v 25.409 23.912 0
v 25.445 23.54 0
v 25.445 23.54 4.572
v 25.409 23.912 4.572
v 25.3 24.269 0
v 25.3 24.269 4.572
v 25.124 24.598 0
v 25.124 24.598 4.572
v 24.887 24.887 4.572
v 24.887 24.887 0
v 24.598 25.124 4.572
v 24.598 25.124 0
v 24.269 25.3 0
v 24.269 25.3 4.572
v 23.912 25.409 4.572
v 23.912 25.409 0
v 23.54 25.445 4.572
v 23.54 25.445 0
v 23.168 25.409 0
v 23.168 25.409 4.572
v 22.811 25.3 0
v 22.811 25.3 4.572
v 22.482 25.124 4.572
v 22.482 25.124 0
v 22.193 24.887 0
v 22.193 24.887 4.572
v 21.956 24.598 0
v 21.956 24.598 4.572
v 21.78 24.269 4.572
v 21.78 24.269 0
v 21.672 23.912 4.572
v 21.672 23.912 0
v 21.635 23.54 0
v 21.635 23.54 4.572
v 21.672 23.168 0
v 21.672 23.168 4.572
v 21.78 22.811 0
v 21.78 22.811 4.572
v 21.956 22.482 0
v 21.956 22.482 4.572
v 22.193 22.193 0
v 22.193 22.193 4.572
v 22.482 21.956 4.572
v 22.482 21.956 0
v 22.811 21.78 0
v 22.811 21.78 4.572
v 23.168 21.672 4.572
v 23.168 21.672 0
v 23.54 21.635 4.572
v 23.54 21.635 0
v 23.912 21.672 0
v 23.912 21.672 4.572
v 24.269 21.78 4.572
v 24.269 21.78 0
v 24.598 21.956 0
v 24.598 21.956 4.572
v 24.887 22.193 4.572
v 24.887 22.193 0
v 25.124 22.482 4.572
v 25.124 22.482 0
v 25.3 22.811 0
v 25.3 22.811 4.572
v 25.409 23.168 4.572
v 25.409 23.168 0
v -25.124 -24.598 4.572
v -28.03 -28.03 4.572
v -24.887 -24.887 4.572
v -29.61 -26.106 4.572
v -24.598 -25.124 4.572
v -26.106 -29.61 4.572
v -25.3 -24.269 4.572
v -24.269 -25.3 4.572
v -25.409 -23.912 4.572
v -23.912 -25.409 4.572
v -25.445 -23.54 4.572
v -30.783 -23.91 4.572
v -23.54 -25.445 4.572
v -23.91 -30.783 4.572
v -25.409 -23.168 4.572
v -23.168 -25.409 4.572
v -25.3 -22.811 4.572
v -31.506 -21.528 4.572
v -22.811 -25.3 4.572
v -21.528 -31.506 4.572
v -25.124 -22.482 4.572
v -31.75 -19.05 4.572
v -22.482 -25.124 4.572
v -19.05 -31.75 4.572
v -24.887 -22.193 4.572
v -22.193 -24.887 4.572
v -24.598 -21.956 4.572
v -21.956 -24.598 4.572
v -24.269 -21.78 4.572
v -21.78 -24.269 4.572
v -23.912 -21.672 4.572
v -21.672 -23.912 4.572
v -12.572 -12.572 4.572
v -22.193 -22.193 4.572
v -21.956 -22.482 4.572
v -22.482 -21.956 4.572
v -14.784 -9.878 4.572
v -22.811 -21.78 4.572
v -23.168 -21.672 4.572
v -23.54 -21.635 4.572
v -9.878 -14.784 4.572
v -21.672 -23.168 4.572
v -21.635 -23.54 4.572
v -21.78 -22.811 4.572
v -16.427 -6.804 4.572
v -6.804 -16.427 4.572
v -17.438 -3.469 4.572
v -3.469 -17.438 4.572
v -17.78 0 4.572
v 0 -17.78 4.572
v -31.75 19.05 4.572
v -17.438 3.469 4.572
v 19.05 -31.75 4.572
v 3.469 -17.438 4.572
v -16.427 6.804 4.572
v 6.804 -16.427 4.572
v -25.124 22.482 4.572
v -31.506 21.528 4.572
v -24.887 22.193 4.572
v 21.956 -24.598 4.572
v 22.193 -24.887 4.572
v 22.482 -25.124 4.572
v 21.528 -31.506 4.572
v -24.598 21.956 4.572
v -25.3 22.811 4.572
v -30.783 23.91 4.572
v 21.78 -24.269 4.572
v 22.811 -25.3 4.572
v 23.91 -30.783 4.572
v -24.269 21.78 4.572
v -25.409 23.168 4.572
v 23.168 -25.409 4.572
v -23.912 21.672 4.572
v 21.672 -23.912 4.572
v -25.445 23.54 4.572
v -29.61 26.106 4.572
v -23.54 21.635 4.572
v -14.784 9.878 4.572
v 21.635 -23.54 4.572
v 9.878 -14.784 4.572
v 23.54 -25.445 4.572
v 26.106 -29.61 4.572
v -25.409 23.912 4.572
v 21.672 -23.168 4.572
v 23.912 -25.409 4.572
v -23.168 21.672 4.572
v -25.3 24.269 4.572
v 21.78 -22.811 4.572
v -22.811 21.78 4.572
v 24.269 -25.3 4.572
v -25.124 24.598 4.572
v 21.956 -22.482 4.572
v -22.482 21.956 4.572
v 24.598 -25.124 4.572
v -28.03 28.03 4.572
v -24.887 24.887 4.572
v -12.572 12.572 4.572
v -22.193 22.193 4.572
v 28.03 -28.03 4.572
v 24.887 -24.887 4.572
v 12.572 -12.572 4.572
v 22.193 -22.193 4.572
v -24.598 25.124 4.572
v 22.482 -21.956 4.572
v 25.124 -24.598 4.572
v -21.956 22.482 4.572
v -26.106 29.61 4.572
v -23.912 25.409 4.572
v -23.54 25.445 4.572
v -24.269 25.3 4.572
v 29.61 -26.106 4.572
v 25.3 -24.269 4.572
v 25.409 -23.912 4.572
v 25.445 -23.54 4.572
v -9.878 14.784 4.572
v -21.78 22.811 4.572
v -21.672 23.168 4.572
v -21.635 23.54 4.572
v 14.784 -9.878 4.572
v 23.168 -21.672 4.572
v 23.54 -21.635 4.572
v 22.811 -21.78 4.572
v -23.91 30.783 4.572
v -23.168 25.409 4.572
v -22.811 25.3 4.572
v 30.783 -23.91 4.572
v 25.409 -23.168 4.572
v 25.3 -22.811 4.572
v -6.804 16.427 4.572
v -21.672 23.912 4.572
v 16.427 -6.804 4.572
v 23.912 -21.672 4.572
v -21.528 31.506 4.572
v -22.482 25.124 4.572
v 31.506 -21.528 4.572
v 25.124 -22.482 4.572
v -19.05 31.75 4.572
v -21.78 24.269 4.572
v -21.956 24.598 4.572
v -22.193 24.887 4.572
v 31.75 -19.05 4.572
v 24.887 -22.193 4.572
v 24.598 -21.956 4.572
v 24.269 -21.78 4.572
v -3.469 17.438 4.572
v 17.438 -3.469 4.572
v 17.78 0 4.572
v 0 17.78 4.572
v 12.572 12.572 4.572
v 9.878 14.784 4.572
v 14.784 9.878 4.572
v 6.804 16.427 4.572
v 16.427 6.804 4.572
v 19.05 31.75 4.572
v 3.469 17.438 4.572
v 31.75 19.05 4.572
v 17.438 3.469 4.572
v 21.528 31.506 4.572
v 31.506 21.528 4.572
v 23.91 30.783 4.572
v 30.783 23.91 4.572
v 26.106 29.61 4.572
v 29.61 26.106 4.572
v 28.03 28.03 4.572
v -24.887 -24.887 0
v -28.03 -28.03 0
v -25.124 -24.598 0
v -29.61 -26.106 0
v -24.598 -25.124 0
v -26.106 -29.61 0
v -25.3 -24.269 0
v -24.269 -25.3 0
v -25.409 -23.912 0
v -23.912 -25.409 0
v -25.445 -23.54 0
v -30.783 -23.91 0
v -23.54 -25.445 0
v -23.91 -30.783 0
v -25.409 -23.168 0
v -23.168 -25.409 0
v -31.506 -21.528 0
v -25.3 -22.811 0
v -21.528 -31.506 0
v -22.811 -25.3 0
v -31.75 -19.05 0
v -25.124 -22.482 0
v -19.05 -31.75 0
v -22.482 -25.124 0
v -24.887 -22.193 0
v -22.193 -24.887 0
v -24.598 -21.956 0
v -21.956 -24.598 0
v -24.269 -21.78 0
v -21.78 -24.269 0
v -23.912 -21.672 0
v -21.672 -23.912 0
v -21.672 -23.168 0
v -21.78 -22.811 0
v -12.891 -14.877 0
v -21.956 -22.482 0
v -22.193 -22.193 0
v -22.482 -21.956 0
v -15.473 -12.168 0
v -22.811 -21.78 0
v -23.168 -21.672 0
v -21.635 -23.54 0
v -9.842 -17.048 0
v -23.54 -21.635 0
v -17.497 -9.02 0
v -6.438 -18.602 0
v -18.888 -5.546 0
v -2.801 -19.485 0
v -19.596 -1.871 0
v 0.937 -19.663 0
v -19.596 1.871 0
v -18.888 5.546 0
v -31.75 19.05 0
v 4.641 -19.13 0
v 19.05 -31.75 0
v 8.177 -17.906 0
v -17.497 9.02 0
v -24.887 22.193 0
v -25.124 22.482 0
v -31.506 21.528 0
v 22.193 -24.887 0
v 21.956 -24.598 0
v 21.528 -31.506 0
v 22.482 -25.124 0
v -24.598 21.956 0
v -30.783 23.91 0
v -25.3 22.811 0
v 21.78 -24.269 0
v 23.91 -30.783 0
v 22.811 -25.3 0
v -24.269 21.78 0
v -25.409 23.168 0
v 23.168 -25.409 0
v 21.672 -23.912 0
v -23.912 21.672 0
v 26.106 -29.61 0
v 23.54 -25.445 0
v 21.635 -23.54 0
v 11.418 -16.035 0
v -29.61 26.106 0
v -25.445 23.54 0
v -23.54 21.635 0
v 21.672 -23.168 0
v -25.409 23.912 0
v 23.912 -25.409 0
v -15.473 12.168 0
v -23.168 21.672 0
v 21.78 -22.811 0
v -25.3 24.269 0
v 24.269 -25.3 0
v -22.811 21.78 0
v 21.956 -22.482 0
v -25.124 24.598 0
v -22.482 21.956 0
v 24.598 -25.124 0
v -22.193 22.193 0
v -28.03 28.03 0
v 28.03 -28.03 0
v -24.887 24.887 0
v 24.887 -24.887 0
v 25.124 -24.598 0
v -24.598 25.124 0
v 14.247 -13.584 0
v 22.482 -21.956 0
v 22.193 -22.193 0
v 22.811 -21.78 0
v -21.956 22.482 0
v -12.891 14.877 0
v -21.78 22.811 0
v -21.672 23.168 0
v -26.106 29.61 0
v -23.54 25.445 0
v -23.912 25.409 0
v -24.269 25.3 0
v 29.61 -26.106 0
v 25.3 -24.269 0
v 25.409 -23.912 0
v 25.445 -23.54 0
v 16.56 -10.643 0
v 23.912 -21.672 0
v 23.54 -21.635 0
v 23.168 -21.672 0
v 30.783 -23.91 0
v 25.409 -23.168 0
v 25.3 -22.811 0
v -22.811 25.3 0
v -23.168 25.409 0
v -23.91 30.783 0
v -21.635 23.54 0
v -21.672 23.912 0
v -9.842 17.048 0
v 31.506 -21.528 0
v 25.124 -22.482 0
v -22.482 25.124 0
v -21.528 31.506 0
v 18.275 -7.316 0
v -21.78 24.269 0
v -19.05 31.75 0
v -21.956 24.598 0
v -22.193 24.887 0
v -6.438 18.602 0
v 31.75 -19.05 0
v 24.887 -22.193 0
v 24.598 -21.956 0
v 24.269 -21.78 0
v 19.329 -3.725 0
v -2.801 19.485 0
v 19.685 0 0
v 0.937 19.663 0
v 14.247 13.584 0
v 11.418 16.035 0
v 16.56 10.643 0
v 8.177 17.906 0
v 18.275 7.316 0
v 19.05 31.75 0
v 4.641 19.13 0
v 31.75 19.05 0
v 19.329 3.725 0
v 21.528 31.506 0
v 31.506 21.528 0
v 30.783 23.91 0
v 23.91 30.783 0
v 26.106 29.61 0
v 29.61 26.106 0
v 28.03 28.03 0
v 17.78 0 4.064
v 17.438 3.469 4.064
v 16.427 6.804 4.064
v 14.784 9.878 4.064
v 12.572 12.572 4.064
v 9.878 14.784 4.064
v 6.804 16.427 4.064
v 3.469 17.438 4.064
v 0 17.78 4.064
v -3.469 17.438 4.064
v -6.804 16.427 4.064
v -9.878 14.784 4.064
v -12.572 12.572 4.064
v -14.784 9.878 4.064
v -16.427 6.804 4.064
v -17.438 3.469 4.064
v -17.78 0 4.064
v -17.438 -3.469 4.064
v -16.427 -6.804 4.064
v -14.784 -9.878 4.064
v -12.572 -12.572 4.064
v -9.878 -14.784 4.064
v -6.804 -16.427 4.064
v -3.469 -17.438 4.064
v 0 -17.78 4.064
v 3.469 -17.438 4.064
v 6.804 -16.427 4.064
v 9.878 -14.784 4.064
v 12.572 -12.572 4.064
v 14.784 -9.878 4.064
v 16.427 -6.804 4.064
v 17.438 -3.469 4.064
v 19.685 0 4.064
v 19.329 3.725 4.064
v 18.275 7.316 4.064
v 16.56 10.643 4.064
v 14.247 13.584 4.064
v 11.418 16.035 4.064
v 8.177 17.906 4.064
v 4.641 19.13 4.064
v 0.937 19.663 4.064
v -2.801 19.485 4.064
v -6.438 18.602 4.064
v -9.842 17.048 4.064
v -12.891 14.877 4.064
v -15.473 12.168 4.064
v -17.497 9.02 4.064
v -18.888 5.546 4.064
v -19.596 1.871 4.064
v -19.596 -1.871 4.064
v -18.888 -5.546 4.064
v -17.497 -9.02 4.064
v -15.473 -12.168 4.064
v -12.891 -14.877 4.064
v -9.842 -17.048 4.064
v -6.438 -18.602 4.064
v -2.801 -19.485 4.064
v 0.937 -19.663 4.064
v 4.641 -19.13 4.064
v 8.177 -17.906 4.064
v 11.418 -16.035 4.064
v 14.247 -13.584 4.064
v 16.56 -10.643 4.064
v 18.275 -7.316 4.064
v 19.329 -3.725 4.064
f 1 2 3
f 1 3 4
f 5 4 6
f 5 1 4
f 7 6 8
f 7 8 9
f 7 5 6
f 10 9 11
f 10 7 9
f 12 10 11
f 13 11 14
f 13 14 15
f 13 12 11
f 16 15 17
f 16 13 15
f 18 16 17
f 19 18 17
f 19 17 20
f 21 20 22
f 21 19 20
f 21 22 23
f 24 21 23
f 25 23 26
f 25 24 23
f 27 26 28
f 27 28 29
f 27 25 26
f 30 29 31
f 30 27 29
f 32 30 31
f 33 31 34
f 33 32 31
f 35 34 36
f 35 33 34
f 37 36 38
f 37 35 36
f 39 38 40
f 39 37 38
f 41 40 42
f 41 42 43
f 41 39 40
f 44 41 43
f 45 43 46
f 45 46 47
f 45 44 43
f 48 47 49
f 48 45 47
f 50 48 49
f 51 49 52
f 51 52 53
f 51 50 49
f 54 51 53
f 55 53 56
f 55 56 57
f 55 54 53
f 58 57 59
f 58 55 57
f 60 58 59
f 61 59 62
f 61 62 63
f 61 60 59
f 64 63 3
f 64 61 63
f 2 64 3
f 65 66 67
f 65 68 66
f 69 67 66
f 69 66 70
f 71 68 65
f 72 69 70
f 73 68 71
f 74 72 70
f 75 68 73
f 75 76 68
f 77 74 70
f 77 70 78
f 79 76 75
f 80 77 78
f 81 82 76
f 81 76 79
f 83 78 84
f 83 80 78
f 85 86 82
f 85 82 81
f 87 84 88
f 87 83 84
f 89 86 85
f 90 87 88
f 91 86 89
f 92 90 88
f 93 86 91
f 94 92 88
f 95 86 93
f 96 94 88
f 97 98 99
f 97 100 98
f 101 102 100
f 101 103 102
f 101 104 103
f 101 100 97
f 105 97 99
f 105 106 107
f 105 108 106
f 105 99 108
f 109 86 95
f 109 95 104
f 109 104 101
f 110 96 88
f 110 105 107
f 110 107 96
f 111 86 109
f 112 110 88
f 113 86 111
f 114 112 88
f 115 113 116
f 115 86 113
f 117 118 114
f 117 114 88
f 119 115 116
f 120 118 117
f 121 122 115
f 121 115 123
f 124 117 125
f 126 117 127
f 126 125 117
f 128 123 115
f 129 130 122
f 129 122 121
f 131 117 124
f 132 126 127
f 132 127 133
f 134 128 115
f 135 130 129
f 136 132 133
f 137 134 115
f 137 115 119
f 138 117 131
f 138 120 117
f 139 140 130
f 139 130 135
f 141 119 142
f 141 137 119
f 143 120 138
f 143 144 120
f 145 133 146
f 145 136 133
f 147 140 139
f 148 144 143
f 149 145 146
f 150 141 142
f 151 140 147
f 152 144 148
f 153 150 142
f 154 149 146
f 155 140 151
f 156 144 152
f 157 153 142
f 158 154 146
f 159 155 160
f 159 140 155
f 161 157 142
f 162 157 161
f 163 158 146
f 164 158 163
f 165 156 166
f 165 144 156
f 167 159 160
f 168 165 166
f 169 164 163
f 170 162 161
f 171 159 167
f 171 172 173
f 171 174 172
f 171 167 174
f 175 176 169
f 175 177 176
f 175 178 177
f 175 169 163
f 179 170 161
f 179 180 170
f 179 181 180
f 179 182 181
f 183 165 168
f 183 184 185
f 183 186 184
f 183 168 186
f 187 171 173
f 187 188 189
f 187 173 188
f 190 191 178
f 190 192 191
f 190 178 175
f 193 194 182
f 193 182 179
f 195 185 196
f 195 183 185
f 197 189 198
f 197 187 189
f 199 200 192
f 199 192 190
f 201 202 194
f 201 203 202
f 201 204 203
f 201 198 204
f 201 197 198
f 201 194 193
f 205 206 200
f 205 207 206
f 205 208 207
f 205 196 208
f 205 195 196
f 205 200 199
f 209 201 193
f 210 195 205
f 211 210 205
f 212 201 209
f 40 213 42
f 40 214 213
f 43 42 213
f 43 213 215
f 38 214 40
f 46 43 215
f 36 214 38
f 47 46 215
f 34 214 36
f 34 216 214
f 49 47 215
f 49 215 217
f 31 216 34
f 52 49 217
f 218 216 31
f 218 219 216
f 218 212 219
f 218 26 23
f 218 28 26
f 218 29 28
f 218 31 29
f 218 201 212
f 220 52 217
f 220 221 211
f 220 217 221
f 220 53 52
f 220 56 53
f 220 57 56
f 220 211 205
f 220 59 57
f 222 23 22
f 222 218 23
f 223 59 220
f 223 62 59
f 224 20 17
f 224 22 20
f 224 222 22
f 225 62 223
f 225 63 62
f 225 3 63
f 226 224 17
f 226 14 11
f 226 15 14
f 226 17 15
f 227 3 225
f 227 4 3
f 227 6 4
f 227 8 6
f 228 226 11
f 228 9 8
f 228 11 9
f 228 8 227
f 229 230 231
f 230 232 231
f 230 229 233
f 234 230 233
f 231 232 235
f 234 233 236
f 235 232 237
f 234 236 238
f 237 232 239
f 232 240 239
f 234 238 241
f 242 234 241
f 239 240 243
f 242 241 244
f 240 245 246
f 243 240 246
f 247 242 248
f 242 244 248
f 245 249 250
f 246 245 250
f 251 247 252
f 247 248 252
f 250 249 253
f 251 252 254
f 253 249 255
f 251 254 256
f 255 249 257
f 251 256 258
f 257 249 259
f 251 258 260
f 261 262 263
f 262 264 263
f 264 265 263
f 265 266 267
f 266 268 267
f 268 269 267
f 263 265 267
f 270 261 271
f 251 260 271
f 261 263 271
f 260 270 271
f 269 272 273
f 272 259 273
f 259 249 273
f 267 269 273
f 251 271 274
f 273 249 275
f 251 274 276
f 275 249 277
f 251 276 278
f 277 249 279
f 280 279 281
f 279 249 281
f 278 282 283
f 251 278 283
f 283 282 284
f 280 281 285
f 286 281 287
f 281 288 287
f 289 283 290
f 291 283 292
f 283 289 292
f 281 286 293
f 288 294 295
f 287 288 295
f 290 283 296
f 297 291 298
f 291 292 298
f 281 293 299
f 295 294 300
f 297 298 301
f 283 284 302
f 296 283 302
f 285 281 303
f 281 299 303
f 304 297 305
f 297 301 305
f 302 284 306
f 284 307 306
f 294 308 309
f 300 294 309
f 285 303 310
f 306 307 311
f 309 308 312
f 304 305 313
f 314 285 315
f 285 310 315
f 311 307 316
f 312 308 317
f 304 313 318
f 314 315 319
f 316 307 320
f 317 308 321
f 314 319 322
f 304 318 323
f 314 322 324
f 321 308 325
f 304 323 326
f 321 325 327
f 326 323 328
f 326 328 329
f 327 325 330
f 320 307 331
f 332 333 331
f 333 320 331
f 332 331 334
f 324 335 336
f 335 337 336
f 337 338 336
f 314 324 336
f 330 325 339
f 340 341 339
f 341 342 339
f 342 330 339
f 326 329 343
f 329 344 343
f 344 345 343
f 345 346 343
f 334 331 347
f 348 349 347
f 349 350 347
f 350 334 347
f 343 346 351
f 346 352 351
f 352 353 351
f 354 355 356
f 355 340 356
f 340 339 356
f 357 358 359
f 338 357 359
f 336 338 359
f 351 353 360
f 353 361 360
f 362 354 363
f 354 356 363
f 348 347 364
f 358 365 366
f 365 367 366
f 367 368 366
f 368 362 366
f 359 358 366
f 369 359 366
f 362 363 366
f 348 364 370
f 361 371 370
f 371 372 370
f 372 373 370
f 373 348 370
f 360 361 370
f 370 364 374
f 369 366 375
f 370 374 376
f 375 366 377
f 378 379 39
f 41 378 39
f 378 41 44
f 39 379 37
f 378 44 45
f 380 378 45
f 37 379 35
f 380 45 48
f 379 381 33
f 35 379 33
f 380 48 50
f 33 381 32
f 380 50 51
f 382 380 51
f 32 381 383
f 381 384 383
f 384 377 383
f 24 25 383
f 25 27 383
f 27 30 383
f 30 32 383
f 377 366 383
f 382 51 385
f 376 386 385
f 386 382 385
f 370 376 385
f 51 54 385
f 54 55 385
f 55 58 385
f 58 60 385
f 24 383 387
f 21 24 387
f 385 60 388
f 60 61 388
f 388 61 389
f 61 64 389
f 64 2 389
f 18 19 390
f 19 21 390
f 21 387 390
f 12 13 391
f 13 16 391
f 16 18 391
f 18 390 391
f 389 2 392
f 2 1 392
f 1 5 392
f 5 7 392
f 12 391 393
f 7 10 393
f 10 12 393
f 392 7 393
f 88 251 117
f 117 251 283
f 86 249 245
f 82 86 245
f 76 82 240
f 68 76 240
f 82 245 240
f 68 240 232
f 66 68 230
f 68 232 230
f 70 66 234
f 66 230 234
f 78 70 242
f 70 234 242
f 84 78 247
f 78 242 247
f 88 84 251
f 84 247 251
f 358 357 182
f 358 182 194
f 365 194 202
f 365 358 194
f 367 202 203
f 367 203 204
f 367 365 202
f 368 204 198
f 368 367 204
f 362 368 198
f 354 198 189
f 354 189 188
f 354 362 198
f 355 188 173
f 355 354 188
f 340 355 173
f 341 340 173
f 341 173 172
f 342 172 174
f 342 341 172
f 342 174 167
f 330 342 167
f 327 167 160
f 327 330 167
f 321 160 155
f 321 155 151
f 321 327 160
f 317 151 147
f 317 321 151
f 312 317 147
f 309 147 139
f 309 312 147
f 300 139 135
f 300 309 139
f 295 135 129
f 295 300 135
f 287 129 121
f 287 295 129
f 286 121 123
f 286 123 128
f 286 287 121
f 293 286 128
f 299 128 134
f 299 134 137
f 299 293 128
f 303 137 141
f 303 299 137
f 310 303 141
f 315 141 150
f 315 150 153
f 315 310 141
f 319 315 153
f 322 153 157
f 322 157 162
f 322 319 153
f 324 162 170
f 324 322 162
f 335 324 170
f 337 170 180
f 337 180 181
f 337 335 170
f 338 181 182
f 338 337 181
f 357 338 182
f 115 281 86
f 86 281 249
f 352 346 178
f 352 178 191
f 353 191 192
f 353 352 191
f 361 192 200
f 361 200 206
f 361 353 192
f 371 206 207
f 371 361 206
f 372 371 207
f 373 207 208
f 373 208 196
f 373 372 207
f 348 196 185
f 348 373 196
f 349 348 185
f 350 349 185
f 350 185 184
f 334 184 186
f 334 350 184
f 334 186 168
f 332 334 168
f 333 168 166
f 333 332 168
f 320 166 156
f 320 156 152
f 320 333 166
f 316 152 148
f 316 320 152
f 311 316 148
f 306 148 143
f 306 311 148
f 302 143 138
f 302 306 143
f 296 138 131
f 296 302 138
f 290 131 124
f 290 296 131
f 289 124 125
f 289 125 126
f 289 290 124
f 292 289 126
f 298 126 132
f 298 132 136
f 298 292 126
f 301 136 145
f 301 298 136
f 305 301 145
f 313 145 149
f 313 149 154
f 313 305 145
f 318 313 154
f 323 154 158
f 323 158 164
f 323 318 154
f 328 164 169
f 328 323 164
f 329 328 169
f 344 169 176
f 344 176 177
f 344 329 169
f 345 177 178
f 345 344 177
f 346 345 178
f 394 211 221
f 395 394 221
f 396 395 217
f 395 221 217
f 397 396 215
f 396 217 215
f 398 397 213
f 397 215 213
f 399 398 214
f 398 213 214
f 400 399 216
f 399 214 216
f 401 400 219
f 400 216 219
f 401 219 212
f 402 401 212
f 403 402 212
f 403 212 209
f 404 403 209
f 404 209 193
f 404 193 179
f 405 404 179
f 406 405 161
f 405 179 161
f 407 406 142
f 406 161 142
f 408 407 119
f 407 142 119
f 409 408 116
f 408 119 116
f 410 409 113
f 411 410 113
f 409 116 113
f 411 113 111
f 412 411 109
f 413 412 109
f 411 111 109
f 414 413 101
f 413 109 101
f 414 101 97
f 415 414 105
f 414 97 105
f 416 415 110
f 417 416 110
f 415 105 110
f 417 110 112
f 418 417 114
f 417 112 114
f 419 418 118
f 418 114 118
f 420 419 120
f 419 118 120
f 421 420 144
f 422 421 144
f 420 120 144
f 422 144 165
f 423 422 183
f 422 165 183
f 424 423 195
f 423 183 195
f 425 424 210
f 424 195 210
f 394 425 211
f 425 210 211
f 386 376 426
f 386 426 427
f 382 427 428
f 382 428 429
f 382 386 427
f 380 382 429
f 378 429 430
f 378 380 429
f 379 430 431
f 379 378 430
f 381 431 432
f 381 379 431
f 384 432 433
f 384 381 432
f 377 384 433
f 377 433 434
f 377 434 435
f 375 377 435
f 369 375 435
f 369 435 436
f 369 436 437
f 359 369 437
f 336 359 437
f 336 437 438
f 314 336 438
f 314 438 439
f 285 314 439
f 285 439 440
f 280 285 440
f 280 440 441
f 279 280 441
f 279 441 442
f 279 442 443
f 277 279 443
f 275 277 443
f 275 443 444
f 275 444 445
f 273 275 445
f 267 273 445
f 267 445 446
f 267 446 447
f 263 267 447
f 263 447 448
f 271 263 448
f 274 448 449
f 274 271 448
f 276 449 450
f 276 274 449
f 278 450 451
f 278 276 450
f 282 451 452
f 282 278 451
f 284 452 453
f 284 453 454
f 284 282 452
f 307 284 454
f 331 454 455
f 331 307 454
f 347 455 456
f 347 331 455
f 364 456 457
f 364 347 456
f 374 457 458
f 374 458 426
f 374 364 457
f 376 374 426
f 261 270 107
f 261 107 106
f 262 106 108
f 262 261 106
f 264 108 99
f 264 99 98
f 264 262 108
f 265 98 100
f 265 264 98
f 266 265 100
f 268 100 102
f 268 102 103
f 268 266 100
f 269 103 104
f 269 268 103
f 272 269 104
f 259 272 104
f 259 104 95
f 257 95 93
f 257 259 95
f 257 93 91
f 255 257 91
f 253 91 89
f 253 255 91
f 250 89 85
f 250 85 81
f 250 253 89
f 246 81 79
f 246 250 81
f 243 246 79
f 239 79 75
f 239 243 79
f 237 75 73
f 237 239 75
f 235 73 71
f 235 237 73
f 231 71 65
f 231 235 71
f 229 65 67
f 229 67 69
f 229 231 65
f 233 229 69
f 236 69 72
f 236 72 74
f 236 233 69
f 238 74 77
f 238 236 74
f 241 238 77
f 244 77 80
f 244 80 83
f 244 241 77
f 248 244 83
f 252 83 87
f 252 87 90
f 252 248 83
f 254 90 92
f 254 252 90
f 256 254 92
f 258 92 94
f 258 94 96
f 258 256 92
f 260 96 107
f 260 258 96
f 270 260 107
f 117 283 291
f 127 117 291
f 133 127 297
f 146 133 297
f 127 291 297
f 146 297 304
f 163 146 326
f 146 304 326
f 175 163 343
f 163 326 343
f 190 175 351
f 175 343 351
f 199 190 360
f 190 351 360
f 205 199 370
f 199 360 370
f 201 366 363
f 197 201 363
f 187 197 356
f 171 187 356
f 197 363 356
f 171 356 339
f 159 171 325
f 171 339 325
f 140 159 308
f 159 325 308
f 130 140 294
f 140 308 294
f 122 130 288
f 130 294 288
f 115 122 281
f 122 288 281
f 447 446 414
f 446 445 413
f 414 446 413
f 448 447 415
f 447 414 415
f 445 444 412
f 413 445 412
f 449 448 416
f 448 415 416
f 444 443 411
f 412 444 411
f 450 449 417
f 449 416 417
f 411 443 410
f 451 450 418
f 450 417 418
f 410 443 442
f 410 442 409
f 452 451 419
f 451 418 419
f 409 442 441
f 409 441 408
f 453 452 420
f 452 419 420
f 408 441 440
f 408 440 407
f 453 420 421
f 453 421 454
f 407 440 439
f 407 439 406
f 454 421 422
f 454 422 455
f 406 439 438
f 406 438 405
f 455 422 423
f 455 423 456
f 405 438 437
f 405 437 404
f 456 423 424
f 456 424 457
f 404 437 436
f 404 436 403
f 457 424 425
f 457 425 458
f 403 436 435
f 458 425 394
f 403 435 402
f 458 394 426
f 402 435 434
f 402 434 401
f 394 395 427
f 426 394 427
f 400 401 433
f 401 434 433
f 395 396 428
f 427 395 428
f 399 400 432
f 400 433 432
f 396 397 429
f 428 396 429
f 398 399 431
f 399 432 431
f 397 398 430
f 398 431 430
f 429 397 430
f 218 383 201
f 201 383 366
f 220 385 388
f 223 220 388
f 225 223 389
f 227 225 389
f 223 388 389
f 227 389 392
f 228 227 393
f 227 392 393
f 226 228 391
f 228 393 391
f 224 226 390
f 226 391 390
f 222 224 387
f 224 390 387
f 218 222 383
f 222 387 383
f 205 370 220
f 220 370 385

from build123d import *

# Parameters (mm, degrees)
SKETCH1_R           = 19.685
SKETCH1_R_2         = 1.905
BOSS_EXTRUDE1_DEPTH = 4.572
SKETCH2_R           = 19.685
SKETCH2_R_2         = 17.78
BOSS_EXTRUDE2_DEPTH = 0.508


with BuildPart() as part:
    # Sketch1 → Boss-Extrude1 (new body)
    with BuildSketch(Plane.XY):
        with BuildLine():
            Line((-19.05, -31.75), (19.05, -31.75))
            ThreePointArc((19.05, -31.75), (28.030256121, -28.030256121), (31.75, -19.05))
            Line((31.75, -19.05), (31.75, 19.05))
            ThreePointArc((31.75, 19.05), (28.030256121, 28.030256121), (19.05, 31.75))
            Line((19.05, 31.75), (-19.05, 31.75))
            ThreePointArc((-19.05, 31.75), (-28.030256121, 28.030256121), (-31.75, 19.05))
            Line((-31.75, 19.05), (-31.75, -19.05))
            ThreePointArc((-31.75, -19.05), (-28.030256121, -28.030256121), (-19.05, -31.75))
        make_face()
        Circle(SKETCH1_R, mode=Mode.SUBTRACT)
        with Locations((-23.540128061, 23.540128061)):
            Circle(SKETCH1_R_2, mode=Mode.SUBTRACT)
        with Locations((23.540128061, 23.540128061)):
            Circle(SKETCH1_R_2, mode=Mode.SUBTRACT)
        with Locations((23.540128061, -23.540128061)):
            Circle(SKETCH1_R_2, mode=Mode.SUBTRACT)
        with Locations((-23.540128061, -23.540128061)):
            Circle(SKETCH1_R_2, mode=Mode.SUBTRACT)
    extrude(amount=BOSS_EXTRUDE1_DEPTH)

    # Sketch2 → Boss-Extrude2 (add)
    with BuildSketch(Plane.XY.offset(4.572)):
        Circle(SKETCH2_R)
        Circle(SKETCH2_R_2, mode=Mode.SUBTRACT)
    extrude(amount=-BOSS_EXTRUDE2_DEPTH)


solid = part.part
